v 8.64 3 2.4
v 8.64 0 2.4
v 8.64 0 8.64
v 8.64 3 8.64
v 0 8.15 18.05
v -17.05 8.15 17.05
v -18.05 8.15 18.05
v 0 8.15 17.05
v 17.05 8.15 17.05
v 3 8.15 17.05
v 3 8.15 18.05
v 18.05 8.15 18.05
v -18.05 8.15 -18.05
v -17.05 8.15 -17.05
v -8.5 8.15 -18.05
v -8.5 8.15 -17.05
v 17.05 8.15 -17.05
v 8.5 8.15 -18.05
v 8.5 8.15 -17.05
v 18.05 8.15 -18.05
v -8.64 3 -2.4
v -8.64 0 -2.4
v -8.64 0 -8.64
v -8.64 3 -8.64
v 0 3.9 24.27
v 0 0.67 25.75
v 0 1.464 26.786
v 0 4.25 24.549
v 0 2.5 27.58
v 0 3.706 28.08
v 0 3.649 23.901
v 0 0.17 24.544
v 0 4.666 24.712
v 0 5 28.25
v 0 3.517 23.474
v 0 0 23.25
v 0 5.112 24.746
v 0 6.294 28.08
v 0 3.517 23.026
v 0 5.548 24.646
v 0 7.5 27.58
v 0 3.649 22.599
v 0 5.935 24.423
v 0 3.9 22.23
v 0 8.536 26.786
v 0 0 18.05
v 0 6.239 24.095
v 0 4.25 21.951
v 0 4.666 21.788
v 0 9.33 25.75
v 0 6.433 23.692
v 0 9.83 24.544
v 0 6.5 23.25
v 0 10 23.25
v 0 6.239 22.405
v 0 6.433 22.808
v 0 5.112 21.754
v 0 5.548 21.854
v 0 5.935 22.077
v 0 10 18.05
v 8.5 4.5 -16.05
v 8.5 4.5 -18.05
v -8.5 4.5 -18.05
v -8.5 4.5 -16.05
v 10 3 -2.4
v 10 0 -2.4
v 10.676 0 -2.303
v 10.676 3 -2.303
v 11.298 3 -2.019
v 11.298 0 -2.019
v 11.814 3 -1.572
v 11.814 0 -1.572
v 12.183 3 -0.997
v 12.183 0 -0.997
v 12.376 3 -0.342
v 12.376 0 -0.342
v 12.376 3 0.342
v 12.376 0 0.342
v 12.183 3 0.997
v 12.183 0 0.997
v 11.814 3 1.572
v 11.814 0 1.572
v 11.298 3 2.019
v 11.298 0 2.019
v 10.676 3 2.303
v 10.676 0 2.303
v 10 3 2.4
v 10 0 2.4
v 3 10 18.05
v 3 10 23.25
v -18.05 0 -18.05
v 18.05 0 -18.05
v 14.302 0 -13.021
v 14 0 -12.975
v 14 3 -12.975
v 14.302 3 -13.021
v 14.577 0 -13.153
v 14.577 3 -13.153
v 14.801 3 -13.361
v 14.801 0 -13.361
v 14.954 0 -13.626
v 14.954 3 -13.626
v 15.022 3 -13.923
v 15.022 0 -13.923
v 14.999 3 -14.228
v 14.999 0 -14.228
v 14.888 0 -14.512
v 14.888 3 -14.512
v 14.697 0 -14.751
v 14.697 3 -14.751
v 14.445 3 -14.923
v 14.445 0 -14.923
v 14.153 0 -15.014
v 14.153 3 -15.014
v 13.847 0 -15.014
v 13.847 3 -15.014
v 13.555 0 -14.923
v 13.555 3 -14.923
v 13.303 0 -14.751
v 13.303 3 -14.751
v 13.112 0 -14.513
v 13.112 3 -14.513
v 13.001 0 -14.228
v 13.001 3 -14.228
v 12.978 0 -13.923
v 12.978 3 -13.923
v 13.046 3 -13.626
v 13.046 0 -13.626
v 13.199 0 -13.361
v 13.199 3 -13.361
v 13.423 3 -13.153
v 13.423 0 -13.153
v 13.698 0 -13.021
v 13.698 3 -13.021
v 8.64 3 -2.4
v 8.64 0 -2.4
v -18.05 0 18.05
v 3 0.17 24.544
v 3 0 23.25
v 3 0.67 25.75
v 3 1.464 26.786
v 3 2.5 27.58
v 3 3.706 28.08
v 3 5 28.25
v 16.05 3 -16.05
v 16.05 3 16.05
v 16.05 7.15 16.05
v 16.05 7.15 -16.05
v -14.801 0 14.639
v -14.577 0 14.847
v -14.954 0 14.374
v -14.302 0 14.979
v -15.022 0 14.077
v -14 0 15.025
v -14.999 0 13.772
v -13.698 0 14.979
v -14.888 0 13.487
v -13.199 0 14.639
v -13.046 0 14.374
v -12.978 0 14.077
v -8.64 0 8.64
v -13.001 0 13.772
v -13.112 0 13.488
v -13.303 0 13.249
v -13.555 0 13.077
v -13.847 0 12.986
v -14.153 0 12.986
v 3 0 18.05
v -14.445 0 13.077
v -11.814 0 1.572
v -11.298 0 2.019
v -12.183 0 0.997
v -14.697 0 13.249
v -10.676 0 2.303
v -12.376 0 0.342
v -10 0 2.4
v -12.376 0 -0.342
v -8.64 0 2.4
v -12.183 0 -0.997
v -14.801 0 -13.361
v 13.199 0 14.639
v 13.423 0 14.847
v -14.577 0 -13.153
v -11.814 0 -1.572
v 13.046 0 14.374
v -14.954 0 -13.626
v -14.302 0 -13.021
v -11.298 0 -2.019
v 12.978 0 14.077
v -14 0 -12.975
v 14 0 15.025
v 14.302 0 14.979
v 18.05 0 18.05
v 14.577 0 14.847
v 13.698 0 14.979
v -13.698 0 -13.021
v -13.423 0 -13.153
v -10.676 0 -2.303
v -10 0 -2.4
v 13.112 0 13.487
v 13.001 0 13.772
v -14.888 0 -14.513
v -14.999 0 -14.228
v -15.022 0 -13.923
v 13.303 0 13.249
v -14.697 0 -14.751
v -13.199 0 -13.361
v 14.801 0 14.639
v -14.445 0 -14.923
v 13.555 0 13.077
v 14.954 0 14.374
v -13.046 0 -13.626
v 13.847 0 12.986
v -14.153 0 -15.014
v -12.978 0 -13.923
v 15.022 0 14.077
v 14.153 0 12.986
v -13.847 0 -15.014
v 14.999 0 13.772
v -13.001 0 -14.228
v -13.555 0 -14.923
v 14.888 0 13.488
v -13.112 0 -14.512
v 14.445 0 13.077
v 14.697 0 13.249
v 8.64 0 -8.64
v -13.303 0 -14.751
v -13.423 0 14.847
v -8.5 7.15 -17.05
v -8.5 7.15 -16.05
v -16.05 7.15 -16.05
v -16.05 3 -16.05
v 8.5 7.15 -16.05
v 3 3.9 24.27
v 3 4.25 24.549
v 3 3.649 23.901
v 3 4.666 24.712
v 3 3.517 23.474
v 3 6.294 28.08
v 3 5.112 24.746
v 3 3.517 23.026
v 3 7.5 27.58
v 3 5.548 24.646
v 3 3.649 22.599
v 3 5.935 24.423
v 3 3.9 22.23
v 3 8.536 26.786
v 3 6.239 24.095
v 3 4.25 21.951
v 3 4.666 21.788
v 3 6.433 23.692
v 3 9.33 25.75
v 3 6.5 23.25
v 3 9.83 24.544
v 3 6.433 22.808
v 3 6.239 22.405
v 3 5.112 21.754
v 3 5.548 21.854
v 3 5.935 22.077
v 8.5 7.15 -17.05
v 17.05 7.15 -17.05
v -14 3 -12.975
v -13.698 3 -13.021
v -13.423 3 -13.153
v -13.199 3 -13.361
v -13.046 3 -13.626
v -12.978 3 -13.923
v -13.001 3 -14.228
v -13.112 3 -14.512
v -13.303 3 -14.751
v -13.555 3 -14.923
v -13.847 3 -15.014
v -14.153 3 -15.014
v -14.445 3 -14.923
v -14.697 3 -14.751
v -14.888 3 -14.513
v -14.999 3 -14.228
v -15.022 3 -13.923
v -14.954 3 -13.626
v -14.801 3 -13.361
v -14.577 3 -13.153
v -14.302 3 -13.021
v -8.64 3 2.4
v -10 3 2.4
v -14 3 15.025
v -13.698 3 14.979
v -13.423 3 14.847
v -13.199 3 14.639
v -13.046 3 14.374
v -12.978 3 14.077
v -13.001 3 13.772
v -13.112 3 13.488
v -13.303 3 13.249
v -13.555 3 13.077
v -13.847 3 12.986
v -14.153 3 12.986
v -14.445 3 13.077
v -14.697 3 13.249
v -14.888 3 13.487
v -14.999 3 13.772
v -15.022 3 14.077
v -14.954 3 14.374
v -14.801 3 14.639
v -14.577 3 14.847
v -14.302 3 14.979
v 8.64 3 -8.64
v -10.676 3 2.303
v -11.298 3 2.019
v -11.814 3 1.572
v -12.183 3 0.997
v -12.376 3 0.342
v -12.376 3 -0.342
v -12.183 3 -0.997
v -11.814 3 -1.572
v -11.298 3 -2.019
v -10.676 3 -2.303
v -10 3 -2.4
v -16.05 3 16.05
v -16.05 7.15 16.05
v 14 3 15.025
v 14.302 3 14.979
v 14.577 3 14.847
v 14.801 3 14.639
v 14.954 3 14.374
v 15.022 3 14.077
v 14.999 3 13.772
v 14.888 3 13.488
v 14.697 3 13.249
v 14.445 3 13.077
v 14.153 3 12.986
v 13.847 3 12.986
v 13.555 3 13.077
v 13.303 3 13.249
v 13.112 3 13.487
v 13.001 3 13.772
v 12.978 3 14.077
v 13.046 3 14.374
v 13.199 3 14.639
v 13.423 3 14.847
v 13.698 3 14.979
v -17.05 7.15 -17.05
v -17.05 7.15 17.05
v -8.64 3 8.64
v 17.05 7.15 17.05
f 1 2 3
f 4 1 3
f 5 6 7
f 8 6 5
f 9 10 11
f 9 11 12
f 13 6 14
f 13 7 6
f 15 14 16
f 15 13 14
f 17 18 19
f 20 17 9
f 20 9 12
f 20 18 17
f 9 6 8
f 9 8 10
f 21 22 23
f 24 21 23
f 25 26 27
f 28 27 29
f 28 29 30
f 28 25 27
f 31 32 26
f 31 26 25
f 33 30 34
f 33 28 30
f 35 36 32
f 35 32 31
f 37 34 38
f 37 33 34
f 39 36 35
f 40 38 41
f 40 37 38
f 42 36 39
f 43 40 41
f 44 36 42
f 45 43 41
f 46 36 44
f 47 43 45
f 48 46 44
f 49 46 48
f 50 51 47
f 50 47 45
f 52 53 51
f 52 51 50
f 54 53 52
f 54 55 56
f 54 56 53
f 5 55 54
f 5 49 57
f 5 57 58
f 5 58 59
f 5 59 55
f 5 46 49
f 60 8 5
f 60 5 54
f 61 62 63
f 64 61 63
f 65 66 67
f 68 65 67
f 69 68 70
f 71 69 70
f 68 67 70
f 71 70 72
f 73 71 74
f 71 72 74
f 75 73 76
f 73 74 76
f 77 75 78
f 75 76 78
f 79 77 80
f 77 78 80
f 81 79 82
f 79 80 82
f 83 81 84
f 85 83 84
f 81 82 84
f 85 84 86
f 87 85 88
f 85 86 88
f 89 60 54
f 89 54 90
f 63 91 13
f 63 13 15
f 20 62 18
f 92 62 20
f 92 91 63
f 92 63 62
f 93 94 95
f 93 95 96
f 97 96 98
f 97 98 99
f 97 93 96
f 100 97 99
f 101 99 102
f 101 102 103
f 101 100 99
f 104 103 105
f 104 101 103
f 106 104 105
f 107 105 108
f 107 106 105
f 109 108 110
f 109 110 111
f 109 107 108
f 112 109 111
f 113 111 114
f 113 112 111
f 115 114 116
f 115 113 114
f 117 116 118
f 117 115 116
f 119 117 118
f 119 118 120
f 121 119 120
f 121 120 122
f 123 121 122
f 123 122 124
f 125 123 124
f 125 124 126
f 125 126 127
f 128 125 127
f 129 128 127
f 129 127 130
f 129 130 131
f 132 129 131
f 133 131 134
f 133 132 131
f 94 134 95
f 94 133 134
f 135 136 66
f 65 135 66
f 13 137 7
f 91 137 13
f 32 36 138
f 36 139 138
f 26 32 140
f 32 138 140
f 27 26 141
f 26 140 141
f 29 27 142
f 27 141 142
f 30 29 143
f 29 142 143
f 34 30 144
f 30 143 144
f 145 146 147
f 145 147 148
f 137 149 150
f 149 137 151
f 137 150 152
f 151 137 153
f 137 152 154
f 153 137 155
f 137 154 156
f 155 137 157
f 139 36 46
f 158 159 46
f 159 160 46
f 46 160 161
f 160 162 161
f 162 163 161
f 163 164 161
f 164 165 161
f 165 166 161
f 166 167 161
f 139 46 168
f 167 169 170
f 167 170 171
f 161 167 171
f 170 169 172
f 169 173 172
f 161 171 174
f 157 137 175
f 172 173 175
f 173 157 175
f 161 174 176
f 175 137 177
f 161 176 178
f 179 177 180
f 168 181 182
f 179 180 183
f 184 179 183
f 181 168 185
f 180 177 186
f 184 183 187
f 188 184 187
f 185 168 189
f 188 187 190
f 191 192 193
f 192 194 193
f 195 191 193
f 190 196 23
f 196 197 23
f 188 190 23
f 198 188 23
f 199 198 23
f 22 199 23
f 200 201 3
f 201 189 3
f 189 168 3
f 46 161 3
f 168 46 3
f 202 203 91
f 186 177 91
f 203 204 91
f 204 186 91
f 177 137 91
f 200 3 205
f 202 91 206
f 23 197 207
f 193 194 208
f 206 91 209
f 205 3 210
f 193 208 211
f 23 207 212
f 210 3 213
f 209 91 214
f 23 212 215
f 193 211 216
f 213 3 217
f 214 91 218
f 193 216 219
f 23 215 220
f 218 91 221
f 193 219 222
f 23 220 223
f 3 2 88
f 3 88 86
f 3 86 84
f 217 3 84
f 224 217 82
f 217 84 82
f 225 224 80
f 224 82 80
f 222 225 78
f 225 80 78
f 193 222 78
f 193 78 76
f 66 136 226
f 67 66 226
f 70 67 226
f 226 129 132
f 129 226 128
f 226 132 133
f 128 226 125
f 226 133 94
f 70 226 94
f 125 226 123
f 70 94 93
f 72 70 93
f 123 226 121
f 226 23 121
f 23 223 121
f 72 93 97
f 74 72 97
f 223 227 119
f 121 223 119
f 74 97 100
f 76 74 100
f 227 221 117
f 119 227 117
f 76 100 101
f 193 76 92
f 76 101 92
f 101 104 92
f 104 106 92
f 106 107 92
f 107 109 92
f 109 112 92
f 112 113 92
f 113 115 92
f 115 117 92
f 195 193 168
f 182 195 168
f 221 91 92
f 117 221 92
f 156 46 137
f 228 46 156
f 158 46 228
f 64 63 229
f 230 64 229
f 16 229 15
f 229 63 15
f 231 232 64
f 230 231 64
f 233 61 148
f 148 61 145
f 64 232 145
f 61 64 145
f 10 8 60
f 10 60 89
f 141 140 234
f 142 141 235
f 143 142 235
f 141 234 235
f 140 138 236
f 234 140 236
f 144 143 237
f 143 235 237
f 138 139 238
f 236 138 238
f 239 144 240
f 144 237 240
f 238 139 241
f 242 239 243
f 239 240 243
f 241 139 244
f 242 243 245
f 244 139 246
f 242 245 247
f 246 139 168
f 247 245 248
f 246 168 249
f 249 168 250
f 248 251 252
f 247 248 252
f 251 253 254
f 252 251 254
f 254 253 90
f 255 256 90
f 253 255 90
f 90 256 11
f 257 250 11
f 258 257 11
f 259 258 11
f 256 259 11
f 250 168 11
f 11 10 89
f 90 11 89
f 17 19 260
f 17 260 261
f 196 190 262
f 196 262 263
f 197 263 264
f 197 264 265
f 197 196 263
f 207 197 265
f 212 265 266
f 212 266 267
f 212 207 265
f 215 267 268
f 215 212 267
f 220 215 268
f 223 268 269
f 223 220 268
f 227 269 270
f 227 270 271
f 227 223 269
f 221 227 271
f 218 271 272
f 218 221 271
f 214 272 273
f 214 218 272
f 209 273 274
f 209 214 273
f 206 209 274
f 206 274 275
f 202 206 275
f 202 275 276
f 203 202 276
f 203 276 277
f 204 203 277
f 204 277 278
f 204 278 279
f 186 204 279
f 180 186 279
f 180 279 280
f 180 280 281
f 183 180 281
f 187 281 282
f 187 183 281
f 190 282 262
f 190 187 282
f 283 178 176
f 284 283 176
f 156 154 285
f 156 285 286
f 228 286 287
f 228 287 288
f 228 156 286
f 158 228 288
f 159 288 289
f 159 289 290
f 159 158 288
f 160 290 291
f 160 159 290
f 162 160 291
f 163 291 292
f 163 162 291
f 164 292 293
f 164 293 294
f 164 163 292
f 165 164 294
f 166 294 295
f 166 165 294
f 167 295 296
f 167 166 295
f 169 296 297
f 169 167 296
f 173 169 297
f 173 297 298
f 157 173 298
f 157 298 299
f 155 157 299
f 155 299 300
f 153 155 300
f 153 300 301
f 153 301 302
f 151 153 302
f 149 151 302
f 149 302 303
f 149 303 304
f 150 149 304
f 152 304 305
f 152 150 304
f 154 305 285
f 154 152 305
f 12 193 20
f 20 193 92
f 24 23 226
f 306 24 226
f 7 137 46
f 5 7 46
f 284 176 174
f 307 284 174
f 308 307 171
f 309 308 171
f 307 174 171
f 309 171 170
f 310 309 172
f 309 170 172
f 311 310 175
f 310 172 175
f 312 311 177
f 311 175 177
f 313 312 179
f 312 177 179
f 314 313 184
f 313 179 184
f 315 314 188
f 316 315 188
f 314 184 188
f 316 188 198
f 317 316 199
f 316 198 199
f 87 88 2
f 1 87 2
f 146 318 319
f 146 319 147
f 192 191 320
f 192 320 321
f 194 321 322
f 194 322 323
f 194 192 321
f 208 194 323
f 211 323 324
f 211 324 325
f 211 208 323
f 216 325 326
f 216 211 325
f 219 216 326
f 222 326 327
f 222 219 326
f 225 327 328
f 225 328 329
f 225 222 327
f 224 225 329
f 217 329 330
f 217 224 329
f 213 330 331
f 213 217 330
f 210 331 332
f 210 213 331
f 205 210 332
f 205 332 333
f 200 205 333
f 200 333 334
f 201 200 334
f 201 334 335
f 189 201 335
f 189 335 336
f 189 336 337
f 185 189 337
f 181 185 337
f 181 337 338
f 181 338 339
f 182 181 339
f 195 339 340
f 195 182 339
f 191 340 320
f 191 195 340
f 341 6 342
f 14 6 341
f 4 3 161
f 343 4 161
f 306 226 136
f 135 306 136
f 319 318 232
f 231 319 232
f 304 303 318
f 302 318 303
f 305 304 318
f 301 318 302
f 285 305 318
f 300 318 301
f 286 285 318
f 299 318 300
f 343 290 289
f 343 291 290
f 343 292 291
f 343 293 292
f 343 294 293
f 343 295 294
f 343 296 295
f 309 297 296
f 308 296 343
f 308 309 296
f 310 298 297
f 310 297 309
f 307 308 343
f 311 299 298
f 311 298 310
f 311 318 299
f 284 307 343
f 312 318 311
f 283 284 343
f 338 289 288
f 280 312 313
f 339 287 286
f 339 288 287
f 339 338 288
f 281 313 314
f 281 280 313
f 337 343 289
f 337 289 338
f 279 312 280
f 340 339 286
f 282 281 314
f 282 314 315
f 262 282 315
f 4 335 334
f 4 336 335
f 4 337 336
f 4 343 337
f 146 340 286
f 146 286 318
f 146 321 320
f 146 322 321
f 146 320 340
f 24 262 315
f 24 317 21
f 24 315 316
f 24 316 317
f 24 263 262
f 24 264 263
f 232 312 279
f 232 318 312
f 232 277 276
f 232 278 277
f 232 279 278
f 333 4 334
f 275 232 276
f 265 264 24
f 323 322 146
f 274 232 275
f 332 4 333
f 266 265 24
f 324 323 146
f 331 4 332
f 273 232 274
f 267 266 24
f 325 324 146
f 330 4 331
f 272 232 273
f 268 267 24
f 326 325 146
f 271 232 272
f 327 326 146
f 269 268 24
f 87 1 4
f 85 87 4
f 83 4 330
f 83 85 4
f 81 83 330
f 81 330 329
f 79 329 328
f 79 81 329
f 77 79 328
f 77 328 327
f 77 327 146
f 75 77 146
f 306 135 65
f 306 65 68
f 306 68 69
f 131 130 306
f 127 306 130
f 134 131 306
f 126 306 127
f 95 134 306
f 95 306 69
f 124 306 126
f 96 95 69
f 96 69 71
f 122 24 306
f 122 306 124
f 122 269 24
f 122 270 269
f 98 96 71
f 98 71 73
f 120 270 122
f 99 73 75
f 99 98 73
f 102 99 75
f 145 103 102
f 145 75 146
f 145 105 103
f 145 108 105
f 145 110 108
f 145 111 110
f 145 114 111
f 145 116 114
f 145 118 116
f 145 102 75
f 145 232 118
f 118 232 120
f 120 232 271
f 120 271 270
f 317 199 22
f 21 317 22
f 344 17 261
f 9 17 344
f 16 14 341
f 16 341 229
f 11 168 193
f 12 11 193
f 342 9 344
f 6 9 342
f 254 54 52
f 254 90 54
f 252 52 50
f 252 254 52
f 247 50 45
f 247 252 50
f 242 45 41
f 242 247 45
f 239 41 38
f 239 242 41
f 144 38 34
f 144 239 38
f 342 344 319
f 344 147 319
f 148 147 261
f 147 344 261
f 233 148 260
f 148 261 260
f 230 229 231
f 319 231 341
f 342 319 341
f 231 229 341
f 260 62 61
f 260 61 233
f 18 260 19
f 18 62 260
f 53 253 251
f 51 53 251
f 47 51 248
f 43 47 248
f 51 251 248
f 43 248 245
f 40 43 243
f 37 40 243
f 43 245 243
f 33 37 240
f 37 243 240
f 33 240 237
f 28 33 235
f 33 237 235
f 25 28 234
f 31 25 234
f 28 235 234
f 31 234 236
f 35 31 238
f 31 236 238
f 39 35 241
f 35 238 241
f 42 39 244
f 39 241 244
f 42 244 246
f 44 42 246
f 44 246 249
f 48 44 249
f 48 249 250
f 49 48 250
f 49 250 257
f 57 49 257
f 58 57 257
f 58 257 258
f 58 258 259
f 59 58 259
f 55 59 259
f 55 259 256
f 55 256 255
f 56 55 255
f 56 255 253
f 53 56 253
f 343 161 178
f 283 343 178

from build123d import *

# Parameters (mm, degrees)
SKETCH1_W           = 36.1
SKETCH1_H           = 36.1
SKETCH1_R           = 1.025
BOSS_EXTRUDE1_DEPTH = 3
SKETCH1_3_W         = 36.1
SKETCH1_3_H         = 36.1
SKETCH1_3_W_2       = 32.1
SKETCH1_3_H_2       = 32.1
BOSS_EXTRUDE2_DEPTH = 8.15
SKETCH2_W           = 17
SKETCH2_H           = 3.65
CUT_EXTRUDE1_DEPTH  = 6
CUT_EXTRUDE2_DEPTH  = 1
SKETCH6_W           = 3
SKETCH6_H           = 10
BOSS_EXTRUDE3_DEPTH = 10.2
FILLET1_R           = 5
SKETCH7_R           = 1.5
CUT_EXTRUDE3_DEPTH  = 10
CHAMFER1_SIZE2      = 1
CHAMFER1_SIZE       = 1.85


with BuildPart() as part:
    # Sketch1 → Boss-Extrude1 (new body)
    with BuildSketch(Plane(origin=(0, 0, 0), x_dir=(1, 0, 0), z_dir=(0, 1, 0))):
        Rectangle(SKETCH1_W, SKETCH1_H)
        with Locations(Location((-14, 14, 0), (0, 0, 270))):
            Circle(SKETCH1_R, mode=Mode.SUBTRACT)
        with Locations(Location((14, 14, 0), (0, 0, 270))):
            Circle(SKETCH1_R, mode=Mode.SUBTRACT)
        with Locations(Location((14, -14, 0), (0, 0, 270))):
            Circle(SKETCH1_R, mode=Mode.SUBTRACT)
        with Locations(Location((-14, -14, 0), (0, 0, 270))):
            Circle(SKETCH1_R, mode=Mode.SUBTRACT)
        with BuildLine():
            Line((-8.64, 2.4), (-8.64, 8.64))
            Line((-8.64, 8.64), (8.64, 8.64))
            Line((8.64, 8.64), (8.64, 2.4))
            Line((8.64, 2.4), (10, 2.4))
            ThreePointArc((10, 2.4), (12.4, 0), (10, -2.4))
            Line((10, -2.4), (8.64, -2.4))
            Line((8.64, -2.4), (8.64, -8.64))
            Line((8.64, -8.64), (-8.64, -8.64))
            Line((-8.64, -8.64), (-8.64, -2.4))
            Line((-8.64, -2.4), (-10, -2.4))
            ThreePointArc((-10, -2.4), (-12.4, 0), (-10, 2.4))
            Line((-10, 2.4), (-8.64, 2.4))
        make_face(mode=Mode.SUBTRACT)
    extrude(amount=BOSS_EXTRUDE1_DEPTH)

    # Sketch1<3> → Boss-Extrude2 (add)
    with BuildSketch(Plane(origin=(0, 0, 0), x_dir=(1, 0, 0), z_dir=(0, 1, 0))):
        Rectangle(SKETCH1_3_W, SKETCH1_3_H)
        Rectangle(SKETCH1_3_W_2, SKETCH1_3_H_2, mode=Mode.SUBTRACT)
    extrude(amount=BOSS_EXTRUDE2_DEPTH)

    # Sketch2 → Cut-Extrude1 (cut)
    with BuildSketch(Plane(origin=(0, 0, -18.05), x_dir=(-1, 0, 0), z_dir=(0, 0, -1))):
        with Locations((0, 6.325)):
            Rectangle(SKETCH2_W, SKETCH2_H)
    extrude(amount=-CUT_EXTRUDE1_DEPTH, mode=Mode.SUBTRACT)

    # Sketch4 → Cut-Extrude2 (cut)
    with BuildSketch(Plane(origin=(0, 8.15, 0), x_dir=(1, 0, 0), z_dir=(0, 1, 0))):
        Polygon((17.05, -17.05), (-17.05, -17.05), (-17.05, 17.05), (-8.5, 17.05), (-8.5, 16.05), (-16.05, 16.05), (-16.05, -16.05), (16.05, -16.05), (16.05, 16.05), (8.5, 16.05), (8.5, 17.05), (17.05, 17.05), align=None)
    extrude(amount=-CUT_EXTRUDE2_DEPTH, mode=Mode.SUBTRACT)

    # Sketch6 → Boss-Extrude3 (add)
    with BuildSketch(Plane.XY.offset(18.05)):
        with Locations((1.5, 5)):
            Rectangle(SKETCH6_W, SKETCH6_H)
    extrude(amount=BOSS_EXTRUDE3_DEPTH)

    # Fillet1
    fillet1_edges = [part.edges().sort_by_distance(p)[0] for p in [
        (1.5, 0, 28.25),
        (1.5, 10, 28.25),
    ]]
    fillet(fillet1_edges, radius=FILLET1_R - 0.0001)  # a hair under: the kernel refuses the full size

    # Sketch7 → Cut-Extrude3 (cut)
    with BuildSketch(Plane(origin=(3, 0, 0), x_dir=(0, 0, -1), z_dir=(1, 0, 0))):
        with Locations(Location((-23.25, 5, 0), (0, 0, 90))):
            Circle(SKETCH7_R)
    extrude(amount=-CUT_EXTRUDE3_DEPTH, mode=Mode.SUBTRACT)

    # Chamfer1
    chamfer1_edges = [part.edges().sort_by_distance(p)[0] for p in [
        (1.5, 8.15, 18.05),
    ]]
    chamfer1_side = [part.faces().sort_by_distance(p)[0] for p in [
        (1.5, 8.17, 18.05),
    ]]
    chamfer(chamfer1_edges, length=CHAMFER1_SIZE - 0.0001, length2=CHAMFER1_SIZE2 - 0.0001, reference=chamfer1_side[0])  # a hair under: the kernel refuses the full size


solid = part.part
